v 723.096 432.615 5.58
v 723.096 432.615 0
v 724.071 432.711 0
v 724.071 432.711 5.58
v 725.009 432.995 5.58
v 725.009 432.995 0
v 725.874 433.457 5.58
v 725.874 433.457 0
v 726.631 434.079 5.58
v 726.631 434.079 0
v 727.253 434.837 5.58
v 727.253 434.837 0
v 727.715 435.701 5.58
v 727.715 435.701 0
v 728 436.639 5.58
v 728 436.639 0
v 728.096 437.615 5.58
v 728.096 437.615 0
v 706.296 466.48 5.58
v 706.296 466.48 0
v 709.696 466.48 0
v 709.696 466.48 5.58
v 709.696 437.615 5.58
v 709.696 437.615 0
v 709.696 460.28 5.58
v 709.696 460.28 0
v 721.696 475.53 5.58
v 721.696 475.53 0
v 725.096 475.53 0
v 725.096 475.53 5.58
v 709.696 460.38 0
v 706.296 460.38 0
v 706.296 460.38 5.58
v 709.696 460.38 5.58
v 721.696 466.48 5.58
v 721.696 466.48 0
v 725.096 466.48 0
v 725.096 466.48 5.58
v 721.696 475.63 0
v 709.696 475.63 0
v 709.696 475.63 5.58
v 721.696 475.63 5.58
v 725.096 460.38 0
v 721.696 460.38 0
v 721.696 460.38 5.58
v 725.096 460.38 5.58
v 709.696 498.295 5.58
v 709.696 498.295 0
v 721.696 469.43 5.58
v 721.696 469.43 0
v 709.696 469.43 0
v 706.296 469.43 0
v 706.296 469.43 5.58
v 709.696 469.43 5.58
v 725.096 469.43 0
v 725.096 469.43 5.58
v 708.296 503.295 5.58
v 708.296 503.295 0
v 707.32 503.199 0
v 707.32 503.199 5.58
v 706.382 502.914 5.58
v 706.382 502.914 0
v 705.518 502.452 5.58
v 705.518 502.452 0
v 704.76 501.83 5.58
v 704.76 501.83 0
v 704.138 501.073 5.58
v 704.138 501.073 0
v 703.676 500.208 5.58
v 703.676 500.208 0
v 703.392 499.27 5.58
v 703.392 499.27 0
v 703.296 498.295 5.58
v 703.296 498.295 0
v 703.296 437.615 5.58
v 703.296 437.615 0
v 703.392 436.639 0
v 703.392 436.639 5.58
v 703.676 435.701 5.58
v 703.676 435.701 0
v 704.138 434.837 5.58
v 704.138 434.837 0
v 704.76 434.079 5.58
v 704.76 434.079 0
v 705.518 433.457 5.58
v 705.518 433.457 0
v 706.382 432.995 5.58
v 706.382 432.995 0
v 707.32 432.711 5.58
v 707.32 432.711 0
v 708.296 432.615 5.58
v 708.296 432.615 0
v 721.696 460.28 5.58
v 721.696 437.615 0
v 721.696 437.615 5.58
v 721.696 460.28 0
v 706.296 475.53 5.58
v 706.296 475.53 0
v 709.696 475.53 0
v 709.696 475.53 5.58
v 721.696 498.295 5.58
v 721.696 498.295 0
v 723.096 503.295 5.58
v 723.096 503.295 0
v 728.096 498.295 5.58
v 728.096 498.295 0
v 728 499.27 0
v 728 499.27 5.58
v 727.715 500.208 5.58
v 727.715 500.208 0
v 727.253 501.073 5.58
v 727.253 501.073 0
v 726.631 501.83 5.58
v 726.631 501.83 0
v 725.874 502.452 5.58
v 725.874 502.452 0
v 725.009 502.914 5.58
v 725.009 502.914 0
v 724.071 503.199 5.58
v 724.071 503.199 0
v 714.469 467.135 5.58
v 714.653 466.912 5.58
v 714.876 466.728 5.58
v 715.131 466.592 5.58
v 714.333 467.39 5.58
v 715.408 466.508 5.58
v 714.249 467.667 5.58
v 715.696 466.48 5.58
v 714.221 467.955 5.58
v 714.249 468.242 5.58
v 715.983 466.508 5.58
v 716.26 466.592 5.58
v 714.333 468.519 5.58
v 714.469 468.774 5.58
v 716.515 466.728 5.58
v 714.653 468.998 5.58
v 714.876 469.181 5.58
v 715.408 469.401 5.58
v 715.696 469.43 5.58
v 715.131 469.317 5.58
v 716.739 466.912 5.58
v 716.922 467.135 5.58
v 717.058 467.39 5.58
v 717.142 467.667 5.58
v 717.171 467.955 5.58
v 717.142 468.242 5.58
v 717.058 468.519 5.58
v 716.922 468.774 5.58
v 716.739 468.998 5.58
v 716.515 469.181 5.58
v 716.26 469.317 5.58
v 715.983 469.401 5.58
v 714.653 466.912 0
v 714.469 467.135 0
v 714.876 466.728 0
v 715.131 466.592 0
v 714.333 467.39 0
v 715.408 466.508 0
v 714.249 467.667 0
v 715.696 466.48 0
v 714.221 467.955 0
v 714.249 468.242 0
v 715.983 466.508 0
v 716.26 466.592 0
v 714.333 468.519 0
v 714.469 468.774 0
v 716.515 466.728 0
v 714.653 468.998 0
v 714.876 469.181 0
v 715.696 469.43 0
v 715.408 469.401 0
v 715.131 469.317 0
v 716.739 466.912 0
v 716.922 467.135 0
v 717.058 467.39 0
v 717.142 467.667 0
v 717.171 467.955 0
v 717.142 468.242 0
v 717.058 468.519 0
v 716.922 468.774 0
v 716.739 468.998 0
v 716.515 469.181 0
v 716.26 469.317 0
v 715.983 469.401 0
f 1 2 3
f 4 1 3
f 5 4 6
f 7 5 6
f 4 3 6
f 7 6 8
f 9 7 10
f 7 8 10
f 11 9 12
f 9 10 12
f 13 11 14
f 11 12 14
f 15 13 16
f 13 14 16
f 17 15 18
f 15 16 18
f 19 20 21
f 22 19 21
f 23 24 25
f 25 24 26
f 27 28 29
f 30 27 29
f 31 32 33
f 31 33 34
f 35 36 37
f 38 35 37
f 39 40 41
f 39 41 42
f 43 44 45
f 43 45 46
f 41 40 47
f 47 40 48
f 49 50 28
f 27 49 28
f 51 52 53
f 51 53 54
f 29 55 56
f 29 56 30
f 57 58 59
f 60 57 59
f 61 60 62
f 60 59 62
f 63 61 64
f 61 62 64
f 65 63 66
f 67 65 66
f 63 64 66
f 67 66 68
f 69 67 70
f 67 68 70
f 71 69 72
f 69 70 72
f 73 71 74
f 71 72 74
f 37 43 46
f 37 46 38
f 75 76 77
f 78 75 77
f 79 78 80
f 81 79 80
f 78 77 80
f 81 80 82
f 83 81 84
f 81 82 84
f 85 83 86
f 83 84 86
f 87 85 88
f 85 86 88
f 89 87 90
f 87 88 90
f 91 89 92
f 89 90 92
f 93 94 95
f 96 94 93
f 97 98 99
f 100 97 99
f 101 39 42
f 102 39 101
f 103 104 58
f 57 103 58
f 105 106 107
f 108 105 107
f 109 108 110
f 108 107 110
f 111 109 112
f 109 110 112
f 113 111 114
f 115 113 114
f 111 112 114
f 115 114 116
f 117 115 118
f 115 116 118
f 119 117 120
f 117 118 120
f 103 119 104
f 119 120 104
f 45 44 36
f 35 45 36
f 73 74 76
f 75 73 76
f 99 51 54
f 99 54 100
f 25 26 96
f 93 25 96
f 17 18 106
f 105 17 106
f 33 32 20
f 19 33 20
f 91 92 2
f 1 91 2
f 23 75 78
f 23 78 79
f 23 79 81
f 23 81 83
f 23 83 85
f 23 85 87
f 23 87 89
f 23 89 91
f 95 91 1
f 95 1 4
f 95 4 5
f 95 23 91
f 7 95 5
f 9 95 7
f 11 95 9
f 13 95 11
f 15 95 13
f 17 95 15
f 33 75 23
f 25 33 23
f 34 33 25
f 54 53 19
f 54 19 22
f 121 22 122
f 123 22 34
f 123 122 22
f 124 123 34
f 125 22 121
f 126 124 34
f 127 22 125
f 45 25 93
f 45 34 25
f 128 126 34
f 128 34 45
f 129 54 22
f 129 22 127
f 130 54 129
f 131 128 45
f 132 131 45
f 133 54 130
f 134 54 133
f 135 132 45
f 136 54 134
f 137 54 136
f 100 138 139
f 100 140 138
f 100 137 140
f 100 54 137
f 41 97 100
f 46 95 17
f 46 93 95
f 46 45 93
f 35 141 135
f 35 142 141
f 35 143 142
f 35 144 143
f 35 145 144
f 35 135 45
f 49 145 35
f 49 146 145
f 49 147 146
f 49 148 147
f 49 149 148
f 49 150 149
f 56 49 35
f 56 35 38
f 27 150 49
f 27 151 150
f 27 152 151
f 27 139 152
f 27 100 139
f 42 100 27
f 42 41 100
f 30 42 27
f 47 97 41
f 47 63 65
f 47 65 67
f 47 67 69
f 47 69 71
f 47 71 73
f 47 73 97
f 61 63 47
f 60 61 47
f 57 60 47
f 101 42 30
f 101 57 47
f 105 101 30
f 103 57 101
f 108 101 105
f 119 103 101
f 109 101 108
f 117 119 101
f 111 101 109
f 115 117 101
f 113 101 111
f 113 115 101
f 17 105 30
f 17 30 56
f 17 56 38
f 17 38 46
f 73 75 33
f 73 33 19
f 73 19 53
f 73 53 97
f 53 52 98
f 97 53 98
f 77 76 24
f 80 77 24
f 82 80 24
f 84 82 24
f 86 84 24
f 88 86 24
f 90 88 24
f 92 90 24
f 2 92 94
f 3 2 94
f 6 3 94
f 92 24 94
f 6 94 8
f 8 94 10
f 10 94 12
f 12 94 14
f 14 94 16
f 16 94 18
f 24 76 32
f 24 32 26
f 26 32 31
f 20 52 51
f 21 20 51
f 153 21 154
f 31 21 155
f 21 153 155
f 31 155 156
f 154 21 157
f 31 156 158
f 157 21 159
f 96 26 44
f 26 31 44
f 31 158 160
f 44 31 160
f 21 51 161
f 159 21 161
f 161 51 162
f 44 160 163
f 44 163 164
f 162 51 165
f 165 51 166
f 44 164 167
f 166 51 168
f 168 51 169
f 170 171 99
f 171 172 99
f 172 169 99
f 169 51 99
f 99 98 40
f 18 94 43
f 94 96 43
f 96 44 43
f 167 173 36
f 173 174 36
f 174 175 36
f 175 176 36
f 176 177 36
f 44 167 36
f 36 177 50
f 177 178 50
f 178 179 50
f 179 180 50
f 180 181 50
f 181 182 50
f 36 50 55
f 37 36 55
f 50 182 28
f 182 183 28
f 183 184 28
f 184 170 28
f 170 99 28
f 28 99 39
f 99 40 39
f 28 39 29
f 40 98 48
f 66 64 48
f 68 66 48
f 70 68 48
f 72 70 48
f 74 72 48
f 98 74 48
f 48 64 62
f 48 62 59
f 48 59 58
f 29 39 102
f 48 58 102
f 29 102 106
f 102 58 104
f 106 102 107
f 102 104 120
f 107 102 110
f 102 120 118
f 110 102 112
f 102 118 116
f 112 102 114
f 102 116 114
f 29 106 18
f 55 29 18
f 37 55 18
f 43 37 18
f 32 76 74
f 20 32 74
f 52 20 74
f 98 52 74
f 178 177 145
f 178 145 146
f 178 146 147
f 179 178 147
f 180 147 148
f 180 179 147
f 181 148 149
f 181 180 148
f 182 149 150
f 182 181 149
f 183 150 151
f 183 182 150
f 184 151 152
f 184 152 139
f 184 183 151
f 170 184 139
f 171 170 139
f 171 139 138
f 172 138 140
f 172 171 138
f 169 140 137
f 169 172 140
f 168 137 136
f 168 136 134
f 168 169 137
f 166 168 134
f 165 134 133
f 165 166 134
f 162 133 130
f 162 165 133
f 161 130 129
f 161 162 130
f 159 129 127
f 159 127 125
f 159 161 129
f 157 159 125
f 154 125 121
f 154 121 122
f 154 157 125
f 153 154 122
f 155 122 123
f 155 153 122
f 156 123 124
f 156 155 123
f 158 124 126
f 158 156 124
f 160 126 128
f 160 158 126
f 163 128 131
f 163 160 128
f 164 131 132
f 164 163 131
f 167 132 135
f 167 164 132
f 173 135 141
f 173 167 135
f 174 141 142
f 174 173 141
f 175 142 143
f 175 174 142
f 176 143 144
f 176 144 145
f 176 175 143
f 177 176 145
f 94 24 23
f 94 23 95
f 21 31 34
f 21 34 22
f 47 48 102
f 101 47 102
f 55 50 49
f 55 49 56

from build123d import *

# Parameters (mm, degrees)
SKETCH1_W           = 3.4
SKETCH1_H           = 6.1
SKETCH1_W_2         = 12
SKETCH1_H_2         = 22.665
SKETCH1_R           = 1.475
BOSS_EXTRUDE1_DEPTH = 5.58


with BuildPart() as part:
    # Sketch1 → Boss-Extrude1 (new body)
    with BuildSketch(Plane.XY):
        with BuildLine():
            Line((708.295729089, 432.614671907), (715.695729089, 432.614671907))
            Line((715.695729089, 432.614671907), (723.095729089, 432.614671907))
            ThreePointArc((723.095729089, 432.614671907), (726.631262995, 434.079138001), (728.095729089, 437.614671907))
            Line((728.095729089, 437.614671907), (728.095729089, 498.294671907))
            ThreePointArc((728.095729089, 498.294671907), (726.631262995, 501.830205812), (723.095729089, 503.294671907))
            Line((723.095729089, 503.294671907), (715.695729089, 503.294671907))
            Line((715.695729089, 503.294671907), (708.295729089, 503.294671907))
            ThreePointArc((708.295729089, 503.294671907), (704.760195183, 501.830205812), (703.295729089, 498.294671907))
            Line((703.295729089, 498.294671907), (703.295729089, 437.614671907))
            ThreePointArc((703.295729089, 437.614671907), (704.760195183, 434.079138001), (708.295729089, 432.614671907))
        make_face()
        with Locations((707.995729089, 463.429671907)):
            Rectangle(SKETCH1_W, SKETCH1_H, mode=Mode.SUBTRACT)
        with Locations((715.695729089, 448.947171907)):
            Rectangle(SKETCH1_W_2, SKETCH1_H_2, mode=Mode.SUBTRACT)
        with Locations((723.395729089, 463.429671907)):
            Rectangle(SKETCH1_W, SKETCH1_H, mode=Mode.SUBTRACT)
        with Locations((707.995729089, 472.479671907)):
            Rectangle(SKETCH1_W, SKETCH1_H, mode=Mode.SUBTRACT)
        with Locations((715.695729089, 467.954671907)):
            Circle(SKETCH1_R, mode=Mode.SUBTRACT)
        with Locations((723.395729089, 472.479671907)):
            Rectangle(SKETCH1_W, SKETCH1_H, mode=Mode.SUBTRACT)
        with Locations((715.695729089, 486.962171907)):
            Rectangle(SKETCH1_W_2, SKETCH1_H_2, mode=Mode.SUBTRACT)
    extrude(amount=BOSS_EXTRUDE1_DEPTH)


solid = part.part
